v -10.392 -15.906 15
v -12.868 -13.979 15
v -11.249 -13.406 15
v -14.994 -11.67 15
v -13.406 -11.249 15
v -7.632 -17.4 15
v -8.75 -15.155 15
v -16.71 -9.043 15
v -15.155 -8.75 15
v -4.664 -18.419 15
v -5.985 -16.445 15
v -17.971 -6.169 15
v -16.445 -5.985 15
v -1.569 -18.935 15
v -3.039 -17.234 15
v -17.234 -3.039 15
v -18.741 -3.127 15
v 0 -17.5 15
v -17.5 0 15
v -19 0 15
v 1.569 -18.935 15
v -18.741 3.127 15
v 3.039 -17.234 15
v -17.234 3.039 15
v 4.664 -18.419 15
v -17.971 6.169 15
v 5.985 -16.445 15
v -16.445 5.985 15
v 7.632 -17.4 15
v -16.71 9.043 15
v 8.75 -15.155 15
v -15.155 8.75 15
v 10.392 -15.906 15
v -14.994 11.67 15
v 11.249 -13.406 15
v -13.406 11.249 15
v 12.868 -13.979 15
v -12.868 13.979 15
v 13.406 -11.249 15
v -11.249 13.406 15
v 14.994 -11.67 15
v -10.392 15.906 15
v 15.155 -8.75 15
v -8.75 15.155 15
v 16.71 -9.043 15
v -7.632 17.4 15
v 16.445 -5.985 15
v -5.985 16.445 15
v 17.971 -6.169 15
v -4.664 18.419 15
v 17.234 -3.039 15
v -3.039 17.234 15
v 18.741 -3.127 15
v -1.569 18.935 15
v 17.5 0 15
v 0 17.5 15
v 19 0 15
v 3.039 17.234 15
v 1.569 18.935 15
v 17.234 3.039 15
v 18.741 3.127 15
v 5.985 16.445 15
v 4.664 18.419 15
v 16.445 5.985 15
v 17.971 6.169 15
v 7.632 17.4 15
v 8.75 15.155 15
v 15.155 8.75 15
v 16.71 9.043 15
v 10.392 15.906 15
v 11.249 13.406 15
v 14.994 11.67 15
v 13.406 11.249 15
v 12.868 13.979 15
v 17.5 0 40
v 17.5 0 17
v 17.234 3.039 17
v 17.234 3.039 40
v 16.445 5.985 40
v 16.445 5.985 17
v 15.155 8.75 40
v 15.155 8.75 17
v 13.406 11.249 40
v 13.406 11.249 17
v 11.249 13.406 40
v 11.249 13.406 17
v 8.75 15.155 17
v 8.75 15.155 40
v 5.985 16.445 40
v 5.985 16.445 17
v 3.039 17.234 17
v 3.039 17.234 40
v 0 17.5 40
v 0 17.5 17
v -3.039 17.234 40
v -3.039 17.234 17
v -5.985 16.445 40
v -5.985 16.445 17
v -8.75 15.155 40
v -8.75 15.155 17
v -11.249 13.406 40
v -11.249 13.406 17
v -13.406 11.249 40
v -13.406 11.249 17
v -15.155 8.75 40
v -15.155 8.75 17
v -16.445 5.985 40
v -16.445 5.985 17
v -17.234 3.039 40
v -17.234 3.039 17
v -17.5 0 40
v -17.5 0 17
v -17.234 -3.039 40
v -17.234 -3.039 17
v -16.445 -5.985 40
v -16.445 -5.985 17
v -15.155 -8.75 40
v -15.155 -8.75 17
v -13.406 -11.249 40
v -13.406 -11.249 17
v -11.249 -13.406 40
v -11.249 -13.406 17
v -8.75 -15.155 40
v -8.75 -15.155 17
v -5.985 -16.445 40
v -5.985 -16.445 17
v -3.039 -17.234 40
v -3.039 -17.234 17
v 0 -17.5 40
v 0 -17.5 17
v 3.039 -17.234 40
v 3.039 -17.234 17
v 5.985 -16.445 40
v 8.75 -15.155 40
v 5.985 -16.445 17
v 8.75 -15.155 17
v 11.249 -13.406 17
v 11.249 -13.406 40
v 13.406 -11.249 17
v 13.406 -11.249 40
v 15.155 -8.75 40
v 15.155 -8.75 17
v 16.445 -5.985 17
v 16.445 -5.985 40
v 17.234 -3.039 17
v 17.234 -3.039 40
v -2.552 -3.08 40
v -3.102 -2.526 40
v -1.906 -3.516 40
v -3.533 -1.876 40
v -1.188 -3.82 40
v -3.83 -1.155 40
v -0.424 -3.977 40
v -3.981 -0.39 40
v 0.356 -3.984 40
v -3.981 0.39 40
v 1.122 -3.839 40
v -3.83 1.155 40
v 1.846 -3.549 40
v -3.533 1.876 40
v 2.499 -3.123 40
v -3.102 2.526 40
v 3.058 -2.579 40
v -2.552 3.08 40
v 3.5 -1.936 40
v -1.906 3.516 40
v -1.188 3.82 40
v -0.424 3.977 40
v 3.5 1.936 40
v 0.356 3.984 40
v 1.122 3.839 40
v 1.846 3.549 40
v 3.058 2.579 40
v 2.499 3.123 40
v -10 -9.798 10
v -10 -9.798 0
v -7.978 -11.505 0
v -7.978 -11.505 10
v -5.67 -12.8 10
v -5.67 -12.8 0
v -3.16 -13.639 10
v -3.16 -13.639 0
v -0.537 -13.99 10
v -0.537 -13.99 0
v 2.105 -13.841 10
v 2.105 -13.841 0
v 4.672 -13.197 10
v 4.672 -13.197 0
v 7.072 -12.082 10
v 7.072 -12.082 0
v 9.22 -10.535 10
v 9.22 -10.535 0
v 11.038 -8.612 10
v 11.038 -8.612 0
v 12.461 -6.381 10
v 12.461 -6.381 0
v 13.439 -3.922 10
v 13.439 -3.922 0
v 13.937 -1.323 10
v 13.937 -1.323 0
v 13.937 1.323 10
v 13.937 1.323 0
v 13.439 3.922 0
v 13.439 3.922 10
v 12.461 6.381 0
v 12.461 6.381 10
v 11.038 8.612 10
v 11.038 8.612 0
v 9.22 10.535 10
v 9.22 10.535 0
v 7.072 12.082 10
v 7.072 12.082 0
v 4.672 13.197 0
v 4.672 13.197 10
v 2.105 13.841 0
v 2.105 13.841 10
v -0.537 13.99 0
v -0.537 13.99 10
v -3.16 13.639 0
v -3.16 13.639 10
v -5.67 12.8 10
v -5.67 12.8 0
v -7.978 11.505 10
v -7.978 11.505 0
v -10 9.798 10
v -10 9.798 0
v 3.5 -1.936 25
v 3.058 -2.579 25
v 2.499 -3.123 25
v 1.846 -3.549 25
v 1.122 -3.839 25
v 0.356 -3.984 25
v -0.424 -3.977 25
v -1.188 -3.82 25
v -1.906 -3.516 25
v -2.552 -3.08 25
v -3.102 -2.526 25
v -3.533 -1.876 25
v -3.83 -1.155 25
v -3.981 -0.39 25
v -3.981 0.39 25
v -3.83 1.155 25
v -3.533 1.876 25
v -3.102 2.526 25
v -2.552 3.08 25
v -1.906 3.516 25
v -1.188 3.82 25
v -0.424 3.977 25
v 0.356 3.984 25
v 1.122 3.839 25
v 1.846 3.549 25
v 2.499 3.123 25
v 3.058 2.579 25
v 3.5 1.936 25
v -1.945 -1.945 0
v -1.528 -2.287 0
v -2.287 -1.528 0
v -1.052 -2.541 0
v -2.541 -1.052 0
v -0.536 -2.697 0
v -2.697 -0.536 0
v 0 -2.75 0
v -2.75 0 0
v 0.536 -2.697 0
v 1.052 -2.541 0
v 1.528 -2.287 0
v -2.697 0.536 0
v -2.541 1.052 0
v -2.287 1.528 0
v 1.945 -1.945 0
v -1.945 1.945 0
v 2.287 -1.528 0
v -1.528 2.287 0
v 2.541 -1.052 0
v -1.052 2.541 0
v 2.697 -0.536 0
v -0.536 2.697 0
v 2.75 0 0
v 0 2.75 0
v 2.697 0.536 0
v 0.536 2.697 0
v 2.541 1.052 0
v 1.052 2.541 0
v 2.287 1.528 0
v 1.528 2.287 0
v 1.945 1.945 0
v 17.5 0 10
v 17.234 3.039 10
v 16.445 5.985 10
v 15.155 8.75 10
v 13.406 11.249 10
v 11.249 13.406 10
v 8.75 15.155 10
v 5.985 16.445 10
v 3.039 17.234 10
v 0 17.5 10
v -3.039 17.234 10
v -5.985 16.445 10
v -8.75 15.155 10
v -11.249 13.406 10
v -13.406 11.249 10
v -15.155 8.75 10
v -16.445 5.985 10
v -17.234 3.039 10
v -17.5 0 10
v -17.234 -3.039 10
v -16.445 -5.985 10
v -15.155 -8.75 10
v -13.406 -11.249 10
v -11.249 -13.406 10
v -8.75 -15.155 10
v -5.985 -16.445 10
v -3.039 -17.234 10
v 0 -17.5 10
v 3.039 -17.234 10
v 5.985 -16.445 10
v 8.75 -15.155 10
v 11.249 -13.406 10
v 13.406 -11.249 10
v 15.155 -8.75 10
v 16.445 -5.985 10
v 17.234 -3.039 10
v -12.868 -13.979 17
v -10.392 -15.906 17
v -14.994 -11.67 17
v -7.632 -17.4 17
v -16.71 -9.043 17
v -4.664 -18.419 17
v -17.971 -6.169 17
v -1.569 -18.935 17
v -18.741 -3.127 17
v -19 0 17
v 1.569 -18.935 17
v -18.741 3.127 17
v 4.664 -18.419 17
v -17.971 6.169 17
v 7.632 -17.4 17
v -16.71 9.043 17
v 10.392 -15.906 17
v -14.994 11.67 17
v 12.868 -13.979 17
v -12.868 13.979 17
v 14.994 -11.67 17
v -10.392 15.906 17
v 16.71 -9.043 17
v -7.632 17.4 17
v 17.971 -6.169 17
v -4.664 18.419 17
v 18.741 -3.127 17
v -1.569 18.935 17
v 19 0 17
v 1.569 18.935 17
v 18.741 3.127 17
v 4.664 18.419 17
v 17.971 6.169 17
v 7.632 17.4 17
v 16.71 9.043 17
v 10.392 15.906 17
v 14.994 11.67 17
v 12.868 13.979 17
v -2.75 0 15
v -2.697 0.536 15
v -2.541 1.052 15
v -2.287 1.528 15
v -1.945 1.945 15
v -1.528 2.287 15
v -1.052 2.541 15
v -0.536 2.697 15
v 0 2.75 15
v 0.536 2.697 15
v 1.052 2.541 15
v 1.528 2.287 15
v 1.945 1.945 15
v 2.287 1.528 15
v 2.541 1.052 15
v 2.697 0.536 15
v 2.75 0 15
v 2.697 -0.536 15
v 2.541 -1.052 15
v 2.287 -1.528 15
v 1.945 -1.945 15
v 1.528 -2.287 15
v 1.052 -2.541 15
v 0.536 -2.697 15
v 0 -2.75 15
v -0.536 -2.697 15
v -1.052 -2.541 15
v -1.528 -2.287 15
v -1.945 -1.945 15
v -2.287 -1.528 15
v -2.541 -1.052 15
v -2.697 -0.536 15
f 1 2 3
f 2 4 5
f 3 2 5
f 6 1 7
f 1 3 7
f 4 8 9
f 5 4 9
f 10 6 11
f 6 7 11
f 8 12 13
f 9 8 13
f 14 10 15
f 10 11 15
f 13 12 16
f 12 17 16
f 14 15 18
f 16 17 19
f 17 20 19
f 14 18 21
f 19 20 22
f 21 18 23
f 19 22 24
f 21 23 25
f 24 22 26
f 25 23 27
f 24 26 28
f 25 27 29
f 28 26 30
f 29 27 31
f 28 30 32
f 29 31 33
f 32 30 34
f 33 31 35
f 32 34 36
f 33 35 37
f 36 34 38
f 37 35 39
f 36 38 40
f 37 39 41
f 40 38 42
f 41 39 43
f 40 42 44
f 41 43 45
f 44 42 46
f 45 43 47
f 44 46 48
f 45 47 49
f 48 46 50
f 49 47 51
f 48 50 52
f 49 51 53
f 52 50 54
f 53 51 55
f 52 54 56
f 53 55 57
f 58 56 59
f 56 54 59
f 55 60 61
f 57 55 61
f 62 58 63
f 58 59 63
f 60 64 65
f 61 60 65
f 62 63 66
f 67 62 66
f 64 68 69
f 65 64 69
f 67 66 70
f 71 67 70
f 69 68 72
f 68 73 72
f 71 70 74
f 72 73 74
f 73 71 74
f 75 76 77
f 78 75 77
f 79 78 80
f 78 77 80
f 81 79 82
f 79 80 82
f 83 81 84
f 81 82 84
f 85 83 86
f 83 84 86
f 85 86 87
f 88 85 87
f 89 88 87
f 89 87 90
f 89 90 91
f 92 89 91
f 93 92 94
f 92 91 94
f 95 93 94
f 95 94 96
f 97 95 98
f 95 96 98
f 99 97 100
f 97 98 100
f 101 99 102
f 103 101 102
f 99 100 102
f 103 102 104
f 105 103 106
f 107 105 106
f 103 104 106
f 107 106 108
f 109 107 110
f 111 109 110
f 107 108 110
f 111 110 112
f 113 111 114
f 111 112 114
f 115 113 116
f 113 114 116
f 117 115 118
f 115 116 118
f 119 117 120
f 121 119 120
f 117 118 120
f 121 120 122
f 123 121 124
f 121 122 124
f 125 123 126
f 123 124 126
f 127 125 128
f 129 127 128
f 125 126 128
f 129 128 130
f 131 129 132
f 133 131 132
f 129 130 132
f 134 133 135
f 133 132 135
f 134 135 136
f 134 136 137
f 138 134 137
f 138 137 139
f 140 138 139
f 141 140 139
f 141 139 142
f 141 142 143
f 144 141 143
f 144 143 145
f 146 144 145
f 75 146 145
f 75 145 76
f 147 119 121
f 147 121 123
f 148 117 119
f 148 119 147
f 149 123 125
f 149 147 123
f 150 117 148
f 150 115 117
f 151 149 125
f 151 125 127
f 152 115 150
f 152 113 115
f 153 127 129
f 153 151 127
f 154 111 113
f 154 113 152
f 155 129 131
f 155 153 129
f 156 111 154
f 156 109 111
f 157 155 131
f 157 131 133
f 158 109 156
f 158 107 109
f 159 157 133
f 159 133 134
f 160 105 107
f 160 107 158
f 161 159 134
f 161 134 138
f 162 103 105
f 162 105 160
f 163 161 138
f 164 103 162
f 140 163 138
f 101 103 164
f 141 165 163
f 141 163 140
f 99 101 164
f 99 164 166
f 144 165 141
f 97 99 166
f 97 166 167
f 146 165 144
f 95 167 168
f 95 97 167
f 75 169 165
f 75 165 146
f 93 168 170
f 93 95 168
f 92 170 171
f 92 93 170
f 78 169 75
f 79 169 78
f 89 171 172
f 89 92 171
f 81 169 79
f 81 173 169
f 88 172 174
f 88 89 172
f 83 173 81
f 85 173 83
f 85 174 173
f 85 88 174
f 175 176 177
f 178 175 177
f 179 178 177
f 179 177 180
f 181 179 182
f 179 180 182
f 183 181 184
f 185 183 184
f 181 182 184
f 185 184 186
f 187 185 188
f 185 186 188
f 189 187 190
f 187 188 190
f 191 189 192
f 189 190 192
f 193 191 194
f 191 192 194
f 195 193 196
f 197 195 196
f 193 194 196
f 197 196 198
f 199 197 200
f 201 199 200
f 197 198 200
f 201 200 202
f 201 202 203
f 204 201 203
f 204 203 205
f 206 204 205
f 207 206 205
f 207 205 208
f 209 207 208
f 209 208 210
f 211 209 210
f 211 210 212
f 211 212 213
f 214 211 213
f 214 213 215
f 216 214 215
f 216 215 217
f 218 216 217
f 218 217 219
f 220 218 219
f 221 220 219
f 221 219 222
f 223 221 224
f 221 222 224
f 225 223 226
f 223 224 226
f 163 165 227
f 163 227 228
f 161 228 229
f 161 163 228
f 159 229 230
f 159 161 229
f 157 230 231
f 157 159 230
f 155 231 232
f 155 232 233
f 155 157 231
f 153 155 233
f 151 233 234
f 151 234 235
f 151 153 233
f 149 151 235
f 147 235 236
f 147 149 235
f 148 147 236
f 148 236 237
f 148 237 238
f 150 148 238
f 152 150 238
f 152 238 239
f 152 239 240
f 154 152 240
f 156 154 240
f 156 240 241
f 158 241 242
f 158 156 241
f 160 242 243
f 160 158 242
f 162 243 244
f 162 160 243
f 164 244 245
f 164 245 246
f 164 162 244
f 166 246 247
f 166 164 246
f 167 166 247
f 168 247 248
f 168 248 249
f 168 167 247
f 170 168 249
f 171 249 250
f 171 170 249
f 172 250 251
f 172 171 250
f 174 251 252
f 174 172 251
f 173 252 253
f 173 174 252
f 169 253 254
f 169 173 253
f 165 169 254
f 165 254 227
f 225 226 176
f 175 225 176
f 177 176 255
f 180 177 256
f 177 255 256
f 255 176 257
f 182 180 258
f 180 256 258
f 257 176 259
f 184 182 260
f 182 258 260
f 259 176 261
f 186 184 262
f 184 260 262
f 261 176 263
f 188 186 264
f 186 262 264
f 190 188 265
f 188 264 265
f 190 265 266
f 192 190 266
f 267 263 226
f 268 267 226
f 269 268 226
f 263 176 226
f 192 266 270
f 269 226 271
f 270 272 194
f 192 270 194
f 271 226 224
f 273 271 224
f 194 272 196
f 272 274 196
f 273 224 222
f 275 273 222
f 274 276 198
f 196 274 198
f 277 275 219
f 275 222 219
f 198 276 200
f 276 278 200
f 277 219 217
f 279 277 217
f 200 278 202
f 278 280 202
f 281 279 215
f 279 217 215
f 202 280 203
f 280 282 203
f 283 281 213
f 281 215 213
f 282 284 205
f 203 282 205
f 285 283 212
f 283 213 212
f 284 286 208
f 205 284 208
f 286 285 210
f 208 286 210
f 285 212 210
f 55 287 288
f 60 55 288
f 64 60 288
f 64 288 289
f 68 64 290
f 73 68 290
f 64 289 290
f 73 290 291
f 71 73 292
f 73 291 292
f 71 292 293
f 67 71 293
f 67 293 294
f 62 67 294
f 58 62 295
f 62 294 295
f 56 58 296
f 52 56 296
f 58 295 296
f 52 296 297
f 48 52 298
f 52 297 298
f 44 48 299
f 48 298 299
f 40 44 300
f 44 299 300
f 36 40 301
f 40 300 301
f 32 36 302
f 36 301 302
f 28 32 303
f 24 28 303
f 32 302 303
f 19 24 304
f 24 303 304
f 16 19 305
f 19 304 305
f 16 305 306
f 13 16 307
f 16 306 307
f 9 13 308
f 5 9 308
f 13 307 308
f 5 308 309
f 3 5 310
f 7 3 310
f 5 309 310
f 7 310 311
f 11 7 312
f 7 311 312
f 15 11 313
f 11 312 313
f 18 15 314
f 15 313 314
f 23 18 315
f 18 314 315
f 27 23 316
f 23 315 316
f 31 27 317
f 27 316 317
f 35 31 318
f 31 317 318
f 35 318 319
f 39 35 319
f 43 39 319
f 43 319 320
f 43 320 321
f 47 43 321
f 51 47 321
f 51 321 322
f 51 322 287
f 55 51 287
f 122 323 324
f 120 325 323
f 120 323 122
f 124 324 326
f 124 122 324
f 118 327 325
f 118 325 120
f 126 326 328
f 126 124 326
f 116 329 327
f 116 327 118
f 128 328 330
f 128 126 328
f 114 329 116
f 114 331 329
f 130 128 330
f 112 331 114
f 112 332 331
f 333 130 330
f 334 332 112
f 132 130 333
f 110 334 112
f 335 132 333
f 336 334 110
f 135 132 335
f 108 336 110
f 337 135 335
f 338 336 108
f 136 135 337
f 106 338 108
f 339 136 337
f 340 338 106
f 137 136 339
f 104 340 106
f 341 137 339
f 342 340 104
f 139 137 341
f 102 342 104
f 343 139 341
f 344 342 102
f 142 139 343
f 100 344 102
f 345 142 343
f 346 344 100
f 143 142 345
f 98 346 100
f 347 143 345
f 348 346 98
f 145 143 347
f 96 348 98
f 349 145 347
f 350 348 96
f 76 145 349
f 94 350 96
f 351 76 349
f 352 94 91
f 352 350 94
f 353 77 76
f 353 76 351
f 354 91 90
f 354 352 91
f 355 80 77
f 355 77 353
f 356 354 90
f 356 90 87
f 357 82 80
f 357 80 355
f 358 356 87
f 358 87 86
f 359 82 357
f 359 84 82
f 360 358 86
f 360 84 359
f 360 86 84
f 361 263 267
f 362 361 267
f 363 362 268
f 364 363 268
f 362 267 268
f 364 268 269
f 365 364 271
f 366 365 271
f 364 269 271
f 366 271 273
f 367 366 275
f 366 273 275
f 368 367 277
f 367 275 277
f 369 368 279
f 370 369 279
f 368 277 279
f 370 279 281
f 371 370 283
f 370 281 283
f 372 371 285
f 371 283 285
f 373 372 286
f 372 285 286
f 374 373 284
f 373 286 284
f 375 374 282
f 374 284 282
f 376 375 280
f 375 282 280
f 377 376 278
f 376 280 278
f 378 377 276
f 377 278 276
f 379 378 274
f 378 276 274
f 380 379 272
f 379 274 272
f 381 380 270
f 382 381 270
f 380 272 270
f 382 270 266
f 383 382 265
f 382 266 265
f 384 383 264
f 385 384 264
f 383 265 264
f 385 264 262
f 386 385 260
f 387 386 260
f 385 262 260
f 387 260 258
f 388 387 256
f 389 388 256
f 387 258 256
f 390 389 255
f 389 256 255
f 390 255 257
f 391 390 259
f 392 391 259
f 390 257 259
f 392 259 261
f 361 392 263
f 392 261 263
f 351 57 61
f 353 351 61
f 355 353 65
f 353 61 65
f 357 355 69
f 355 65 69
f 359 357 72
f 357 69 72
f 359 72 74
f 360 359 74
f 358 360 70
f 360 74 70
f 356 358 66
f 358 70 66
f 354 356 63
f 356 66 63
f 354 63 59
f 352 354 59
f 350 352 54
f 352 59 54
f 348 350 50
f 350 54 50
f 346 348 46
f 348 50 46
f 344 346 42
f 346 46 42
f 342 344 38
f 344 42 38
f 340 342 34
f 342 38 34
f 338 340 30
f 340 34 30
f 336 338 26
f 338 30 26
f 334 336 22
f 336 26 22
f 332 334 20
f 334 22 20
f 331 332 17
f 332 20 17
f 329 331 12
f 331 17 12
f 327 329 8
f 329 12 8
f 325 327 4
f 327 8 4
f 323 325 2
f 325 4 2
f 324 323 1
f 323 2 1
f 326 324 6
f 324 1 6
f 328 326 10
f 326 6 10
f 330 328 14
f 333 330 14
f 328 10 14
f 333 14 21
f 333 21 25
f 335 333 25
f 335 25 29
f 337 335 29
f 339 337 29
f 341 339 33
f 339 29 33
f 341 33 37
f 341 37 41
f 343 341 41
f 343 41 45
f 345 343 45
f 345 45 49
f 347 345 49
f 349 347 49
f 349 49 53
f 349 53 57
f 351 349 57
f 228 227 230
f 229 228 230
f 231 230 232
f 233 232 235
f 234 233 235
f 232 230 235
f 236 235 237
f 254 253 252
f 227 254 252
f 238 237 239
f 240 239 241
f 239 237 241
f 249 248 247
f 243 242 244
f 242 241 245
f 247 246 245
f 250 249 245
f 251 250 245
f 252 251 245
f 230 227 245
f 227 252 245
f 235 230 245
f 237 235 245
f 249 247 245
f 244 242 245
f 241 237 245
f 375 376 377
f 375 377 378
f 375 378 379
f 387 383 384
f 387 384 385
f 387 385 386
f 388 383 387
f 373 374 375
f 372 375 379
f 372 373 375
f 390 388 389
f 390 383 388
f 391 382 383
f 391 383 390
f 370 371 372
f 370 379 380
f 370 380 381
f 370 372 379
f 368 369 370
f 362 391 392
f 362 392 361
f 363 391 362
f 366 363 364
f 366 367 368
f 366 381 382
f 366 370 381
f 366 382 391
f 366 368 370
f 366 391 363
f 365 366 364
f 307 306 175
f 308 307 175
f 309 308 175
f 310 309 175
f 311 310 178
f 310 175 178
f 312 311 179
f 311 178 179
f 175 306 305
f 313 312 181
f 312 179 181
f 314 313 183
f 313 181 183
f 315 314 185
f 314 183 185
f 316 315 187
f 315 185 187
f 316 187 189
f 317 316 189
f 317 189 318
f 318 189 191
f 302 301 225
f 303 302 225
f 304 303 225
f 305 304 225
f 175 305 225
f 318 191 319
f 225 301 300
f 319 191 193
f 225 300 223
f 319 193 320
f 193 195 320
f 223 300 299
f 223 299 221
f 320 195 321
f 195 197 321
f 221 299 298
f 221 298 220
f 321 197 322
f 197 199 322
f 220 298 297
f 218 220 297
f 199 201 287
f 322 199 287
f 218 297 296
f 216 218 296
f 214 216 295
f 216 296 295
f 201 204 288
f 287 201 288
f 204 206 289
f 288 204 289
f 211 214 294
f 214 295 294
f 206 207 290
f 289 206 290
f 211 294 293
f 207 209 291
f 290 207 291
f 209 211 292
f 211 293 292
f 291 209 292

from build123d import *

# Parameters (mm, degrees)
SKETCH1_R           = 14
BOSS_EXTRUDE2_DEPTH = 10
SKETCH2_R           = 17.5
BOSS_EXTRUDE3_DEPTH = 5
SKETCH3_R           = 19
BOSS_EXTRUDE4_DEPTH = 2
SKETCH4_R           = 17.5
BOSS_EXTRUDE5_DEPTH = 23
CUT_EXTRUDE1_DEPTH  = 10
SKETCH10_R          = 2.75
CUT_EXTRUDE2_DEPTH  = 15
CUT_EXTRUDE3_DEPTH  = 15


with BuildPart() as part:
    # Sketch1 → Boss-Extrude2 (new body)
    with BuildSketch(Plane.XY):
        Circle(SKETCH1_R)
    extrude(amount=BOSS_EXTRUDE2_DEPTH)

    # Sketch2 → Boss-Extrude3 (add)
    with BuildSketch(Plane.XY.offset(10)):
        Circle(SKETCH2_R)
    extrude(amount=BOSS_EXTRUDE3_DEPTH)

    # Sketch3 → Boss-Extrude4 (add)
    with BuildSketch(Plane.XY.offset(15)):
        Circle(SKETCH3_R)
    extrude(amount=BOSS_EXTRUDE4_DEPTH)

    # Sketch4 → Boss-Extrude5 (add)
    with BuildSketch(Plane.XY.offset(17)):
        Circle(SKETCH4_R)
    extrude(amount=BOSS_EXTRUDE5_DEPTH)

    # Sketch5 → Cut-Extrude1 (cut)
    with BuildSketch(Plane(origin=(0, 0, 0), x_dir=(-1, 0, 0), z_dir=(0, 0, -1))):
        with BuildLine():
            Line((10, 0), (10, -9.797958971))
            ThreePointArc((10, -9.797958971), (14, 0), (10, 9.797958971))
            Line((10, 9.797958971), (10, 0))
        make_face()
    extrude(amount=-CUT_EXTRUDE1_DEPTH, mode=Mode.SUBTRACT)

    # Sketch10 → Cut-Extrude2 (cut)
    with BuildSketch(Plane(origin=(0, 0, 0), x_dir=(-1, 0, 0), z_dir=(0, 0, -1))):
        Circle(SKETCH10_R)
    extrude(amount=-CUT_EXTRUDE2_DEPTH, mode=Mode.SUBTRACT)

    # Sketch12 → Cut-Extrude3 (cut)
    with BuildSketch(Plane.XY.offset(40)):
        with BuildLine():
            Line((3.5, 0), (3.5, -1.936491673))
            ThreePointArc((3.5, -1.936491673), (-4, 0), (3.5, 1.936491673))
            Line((3.5, 1.936491673), (3.5, 0))
        make_face()
    extrude(amount=-CUT_EXTRUDE3_DEPTH, mode=Mode.SUBTRACT)


solid = part.part
